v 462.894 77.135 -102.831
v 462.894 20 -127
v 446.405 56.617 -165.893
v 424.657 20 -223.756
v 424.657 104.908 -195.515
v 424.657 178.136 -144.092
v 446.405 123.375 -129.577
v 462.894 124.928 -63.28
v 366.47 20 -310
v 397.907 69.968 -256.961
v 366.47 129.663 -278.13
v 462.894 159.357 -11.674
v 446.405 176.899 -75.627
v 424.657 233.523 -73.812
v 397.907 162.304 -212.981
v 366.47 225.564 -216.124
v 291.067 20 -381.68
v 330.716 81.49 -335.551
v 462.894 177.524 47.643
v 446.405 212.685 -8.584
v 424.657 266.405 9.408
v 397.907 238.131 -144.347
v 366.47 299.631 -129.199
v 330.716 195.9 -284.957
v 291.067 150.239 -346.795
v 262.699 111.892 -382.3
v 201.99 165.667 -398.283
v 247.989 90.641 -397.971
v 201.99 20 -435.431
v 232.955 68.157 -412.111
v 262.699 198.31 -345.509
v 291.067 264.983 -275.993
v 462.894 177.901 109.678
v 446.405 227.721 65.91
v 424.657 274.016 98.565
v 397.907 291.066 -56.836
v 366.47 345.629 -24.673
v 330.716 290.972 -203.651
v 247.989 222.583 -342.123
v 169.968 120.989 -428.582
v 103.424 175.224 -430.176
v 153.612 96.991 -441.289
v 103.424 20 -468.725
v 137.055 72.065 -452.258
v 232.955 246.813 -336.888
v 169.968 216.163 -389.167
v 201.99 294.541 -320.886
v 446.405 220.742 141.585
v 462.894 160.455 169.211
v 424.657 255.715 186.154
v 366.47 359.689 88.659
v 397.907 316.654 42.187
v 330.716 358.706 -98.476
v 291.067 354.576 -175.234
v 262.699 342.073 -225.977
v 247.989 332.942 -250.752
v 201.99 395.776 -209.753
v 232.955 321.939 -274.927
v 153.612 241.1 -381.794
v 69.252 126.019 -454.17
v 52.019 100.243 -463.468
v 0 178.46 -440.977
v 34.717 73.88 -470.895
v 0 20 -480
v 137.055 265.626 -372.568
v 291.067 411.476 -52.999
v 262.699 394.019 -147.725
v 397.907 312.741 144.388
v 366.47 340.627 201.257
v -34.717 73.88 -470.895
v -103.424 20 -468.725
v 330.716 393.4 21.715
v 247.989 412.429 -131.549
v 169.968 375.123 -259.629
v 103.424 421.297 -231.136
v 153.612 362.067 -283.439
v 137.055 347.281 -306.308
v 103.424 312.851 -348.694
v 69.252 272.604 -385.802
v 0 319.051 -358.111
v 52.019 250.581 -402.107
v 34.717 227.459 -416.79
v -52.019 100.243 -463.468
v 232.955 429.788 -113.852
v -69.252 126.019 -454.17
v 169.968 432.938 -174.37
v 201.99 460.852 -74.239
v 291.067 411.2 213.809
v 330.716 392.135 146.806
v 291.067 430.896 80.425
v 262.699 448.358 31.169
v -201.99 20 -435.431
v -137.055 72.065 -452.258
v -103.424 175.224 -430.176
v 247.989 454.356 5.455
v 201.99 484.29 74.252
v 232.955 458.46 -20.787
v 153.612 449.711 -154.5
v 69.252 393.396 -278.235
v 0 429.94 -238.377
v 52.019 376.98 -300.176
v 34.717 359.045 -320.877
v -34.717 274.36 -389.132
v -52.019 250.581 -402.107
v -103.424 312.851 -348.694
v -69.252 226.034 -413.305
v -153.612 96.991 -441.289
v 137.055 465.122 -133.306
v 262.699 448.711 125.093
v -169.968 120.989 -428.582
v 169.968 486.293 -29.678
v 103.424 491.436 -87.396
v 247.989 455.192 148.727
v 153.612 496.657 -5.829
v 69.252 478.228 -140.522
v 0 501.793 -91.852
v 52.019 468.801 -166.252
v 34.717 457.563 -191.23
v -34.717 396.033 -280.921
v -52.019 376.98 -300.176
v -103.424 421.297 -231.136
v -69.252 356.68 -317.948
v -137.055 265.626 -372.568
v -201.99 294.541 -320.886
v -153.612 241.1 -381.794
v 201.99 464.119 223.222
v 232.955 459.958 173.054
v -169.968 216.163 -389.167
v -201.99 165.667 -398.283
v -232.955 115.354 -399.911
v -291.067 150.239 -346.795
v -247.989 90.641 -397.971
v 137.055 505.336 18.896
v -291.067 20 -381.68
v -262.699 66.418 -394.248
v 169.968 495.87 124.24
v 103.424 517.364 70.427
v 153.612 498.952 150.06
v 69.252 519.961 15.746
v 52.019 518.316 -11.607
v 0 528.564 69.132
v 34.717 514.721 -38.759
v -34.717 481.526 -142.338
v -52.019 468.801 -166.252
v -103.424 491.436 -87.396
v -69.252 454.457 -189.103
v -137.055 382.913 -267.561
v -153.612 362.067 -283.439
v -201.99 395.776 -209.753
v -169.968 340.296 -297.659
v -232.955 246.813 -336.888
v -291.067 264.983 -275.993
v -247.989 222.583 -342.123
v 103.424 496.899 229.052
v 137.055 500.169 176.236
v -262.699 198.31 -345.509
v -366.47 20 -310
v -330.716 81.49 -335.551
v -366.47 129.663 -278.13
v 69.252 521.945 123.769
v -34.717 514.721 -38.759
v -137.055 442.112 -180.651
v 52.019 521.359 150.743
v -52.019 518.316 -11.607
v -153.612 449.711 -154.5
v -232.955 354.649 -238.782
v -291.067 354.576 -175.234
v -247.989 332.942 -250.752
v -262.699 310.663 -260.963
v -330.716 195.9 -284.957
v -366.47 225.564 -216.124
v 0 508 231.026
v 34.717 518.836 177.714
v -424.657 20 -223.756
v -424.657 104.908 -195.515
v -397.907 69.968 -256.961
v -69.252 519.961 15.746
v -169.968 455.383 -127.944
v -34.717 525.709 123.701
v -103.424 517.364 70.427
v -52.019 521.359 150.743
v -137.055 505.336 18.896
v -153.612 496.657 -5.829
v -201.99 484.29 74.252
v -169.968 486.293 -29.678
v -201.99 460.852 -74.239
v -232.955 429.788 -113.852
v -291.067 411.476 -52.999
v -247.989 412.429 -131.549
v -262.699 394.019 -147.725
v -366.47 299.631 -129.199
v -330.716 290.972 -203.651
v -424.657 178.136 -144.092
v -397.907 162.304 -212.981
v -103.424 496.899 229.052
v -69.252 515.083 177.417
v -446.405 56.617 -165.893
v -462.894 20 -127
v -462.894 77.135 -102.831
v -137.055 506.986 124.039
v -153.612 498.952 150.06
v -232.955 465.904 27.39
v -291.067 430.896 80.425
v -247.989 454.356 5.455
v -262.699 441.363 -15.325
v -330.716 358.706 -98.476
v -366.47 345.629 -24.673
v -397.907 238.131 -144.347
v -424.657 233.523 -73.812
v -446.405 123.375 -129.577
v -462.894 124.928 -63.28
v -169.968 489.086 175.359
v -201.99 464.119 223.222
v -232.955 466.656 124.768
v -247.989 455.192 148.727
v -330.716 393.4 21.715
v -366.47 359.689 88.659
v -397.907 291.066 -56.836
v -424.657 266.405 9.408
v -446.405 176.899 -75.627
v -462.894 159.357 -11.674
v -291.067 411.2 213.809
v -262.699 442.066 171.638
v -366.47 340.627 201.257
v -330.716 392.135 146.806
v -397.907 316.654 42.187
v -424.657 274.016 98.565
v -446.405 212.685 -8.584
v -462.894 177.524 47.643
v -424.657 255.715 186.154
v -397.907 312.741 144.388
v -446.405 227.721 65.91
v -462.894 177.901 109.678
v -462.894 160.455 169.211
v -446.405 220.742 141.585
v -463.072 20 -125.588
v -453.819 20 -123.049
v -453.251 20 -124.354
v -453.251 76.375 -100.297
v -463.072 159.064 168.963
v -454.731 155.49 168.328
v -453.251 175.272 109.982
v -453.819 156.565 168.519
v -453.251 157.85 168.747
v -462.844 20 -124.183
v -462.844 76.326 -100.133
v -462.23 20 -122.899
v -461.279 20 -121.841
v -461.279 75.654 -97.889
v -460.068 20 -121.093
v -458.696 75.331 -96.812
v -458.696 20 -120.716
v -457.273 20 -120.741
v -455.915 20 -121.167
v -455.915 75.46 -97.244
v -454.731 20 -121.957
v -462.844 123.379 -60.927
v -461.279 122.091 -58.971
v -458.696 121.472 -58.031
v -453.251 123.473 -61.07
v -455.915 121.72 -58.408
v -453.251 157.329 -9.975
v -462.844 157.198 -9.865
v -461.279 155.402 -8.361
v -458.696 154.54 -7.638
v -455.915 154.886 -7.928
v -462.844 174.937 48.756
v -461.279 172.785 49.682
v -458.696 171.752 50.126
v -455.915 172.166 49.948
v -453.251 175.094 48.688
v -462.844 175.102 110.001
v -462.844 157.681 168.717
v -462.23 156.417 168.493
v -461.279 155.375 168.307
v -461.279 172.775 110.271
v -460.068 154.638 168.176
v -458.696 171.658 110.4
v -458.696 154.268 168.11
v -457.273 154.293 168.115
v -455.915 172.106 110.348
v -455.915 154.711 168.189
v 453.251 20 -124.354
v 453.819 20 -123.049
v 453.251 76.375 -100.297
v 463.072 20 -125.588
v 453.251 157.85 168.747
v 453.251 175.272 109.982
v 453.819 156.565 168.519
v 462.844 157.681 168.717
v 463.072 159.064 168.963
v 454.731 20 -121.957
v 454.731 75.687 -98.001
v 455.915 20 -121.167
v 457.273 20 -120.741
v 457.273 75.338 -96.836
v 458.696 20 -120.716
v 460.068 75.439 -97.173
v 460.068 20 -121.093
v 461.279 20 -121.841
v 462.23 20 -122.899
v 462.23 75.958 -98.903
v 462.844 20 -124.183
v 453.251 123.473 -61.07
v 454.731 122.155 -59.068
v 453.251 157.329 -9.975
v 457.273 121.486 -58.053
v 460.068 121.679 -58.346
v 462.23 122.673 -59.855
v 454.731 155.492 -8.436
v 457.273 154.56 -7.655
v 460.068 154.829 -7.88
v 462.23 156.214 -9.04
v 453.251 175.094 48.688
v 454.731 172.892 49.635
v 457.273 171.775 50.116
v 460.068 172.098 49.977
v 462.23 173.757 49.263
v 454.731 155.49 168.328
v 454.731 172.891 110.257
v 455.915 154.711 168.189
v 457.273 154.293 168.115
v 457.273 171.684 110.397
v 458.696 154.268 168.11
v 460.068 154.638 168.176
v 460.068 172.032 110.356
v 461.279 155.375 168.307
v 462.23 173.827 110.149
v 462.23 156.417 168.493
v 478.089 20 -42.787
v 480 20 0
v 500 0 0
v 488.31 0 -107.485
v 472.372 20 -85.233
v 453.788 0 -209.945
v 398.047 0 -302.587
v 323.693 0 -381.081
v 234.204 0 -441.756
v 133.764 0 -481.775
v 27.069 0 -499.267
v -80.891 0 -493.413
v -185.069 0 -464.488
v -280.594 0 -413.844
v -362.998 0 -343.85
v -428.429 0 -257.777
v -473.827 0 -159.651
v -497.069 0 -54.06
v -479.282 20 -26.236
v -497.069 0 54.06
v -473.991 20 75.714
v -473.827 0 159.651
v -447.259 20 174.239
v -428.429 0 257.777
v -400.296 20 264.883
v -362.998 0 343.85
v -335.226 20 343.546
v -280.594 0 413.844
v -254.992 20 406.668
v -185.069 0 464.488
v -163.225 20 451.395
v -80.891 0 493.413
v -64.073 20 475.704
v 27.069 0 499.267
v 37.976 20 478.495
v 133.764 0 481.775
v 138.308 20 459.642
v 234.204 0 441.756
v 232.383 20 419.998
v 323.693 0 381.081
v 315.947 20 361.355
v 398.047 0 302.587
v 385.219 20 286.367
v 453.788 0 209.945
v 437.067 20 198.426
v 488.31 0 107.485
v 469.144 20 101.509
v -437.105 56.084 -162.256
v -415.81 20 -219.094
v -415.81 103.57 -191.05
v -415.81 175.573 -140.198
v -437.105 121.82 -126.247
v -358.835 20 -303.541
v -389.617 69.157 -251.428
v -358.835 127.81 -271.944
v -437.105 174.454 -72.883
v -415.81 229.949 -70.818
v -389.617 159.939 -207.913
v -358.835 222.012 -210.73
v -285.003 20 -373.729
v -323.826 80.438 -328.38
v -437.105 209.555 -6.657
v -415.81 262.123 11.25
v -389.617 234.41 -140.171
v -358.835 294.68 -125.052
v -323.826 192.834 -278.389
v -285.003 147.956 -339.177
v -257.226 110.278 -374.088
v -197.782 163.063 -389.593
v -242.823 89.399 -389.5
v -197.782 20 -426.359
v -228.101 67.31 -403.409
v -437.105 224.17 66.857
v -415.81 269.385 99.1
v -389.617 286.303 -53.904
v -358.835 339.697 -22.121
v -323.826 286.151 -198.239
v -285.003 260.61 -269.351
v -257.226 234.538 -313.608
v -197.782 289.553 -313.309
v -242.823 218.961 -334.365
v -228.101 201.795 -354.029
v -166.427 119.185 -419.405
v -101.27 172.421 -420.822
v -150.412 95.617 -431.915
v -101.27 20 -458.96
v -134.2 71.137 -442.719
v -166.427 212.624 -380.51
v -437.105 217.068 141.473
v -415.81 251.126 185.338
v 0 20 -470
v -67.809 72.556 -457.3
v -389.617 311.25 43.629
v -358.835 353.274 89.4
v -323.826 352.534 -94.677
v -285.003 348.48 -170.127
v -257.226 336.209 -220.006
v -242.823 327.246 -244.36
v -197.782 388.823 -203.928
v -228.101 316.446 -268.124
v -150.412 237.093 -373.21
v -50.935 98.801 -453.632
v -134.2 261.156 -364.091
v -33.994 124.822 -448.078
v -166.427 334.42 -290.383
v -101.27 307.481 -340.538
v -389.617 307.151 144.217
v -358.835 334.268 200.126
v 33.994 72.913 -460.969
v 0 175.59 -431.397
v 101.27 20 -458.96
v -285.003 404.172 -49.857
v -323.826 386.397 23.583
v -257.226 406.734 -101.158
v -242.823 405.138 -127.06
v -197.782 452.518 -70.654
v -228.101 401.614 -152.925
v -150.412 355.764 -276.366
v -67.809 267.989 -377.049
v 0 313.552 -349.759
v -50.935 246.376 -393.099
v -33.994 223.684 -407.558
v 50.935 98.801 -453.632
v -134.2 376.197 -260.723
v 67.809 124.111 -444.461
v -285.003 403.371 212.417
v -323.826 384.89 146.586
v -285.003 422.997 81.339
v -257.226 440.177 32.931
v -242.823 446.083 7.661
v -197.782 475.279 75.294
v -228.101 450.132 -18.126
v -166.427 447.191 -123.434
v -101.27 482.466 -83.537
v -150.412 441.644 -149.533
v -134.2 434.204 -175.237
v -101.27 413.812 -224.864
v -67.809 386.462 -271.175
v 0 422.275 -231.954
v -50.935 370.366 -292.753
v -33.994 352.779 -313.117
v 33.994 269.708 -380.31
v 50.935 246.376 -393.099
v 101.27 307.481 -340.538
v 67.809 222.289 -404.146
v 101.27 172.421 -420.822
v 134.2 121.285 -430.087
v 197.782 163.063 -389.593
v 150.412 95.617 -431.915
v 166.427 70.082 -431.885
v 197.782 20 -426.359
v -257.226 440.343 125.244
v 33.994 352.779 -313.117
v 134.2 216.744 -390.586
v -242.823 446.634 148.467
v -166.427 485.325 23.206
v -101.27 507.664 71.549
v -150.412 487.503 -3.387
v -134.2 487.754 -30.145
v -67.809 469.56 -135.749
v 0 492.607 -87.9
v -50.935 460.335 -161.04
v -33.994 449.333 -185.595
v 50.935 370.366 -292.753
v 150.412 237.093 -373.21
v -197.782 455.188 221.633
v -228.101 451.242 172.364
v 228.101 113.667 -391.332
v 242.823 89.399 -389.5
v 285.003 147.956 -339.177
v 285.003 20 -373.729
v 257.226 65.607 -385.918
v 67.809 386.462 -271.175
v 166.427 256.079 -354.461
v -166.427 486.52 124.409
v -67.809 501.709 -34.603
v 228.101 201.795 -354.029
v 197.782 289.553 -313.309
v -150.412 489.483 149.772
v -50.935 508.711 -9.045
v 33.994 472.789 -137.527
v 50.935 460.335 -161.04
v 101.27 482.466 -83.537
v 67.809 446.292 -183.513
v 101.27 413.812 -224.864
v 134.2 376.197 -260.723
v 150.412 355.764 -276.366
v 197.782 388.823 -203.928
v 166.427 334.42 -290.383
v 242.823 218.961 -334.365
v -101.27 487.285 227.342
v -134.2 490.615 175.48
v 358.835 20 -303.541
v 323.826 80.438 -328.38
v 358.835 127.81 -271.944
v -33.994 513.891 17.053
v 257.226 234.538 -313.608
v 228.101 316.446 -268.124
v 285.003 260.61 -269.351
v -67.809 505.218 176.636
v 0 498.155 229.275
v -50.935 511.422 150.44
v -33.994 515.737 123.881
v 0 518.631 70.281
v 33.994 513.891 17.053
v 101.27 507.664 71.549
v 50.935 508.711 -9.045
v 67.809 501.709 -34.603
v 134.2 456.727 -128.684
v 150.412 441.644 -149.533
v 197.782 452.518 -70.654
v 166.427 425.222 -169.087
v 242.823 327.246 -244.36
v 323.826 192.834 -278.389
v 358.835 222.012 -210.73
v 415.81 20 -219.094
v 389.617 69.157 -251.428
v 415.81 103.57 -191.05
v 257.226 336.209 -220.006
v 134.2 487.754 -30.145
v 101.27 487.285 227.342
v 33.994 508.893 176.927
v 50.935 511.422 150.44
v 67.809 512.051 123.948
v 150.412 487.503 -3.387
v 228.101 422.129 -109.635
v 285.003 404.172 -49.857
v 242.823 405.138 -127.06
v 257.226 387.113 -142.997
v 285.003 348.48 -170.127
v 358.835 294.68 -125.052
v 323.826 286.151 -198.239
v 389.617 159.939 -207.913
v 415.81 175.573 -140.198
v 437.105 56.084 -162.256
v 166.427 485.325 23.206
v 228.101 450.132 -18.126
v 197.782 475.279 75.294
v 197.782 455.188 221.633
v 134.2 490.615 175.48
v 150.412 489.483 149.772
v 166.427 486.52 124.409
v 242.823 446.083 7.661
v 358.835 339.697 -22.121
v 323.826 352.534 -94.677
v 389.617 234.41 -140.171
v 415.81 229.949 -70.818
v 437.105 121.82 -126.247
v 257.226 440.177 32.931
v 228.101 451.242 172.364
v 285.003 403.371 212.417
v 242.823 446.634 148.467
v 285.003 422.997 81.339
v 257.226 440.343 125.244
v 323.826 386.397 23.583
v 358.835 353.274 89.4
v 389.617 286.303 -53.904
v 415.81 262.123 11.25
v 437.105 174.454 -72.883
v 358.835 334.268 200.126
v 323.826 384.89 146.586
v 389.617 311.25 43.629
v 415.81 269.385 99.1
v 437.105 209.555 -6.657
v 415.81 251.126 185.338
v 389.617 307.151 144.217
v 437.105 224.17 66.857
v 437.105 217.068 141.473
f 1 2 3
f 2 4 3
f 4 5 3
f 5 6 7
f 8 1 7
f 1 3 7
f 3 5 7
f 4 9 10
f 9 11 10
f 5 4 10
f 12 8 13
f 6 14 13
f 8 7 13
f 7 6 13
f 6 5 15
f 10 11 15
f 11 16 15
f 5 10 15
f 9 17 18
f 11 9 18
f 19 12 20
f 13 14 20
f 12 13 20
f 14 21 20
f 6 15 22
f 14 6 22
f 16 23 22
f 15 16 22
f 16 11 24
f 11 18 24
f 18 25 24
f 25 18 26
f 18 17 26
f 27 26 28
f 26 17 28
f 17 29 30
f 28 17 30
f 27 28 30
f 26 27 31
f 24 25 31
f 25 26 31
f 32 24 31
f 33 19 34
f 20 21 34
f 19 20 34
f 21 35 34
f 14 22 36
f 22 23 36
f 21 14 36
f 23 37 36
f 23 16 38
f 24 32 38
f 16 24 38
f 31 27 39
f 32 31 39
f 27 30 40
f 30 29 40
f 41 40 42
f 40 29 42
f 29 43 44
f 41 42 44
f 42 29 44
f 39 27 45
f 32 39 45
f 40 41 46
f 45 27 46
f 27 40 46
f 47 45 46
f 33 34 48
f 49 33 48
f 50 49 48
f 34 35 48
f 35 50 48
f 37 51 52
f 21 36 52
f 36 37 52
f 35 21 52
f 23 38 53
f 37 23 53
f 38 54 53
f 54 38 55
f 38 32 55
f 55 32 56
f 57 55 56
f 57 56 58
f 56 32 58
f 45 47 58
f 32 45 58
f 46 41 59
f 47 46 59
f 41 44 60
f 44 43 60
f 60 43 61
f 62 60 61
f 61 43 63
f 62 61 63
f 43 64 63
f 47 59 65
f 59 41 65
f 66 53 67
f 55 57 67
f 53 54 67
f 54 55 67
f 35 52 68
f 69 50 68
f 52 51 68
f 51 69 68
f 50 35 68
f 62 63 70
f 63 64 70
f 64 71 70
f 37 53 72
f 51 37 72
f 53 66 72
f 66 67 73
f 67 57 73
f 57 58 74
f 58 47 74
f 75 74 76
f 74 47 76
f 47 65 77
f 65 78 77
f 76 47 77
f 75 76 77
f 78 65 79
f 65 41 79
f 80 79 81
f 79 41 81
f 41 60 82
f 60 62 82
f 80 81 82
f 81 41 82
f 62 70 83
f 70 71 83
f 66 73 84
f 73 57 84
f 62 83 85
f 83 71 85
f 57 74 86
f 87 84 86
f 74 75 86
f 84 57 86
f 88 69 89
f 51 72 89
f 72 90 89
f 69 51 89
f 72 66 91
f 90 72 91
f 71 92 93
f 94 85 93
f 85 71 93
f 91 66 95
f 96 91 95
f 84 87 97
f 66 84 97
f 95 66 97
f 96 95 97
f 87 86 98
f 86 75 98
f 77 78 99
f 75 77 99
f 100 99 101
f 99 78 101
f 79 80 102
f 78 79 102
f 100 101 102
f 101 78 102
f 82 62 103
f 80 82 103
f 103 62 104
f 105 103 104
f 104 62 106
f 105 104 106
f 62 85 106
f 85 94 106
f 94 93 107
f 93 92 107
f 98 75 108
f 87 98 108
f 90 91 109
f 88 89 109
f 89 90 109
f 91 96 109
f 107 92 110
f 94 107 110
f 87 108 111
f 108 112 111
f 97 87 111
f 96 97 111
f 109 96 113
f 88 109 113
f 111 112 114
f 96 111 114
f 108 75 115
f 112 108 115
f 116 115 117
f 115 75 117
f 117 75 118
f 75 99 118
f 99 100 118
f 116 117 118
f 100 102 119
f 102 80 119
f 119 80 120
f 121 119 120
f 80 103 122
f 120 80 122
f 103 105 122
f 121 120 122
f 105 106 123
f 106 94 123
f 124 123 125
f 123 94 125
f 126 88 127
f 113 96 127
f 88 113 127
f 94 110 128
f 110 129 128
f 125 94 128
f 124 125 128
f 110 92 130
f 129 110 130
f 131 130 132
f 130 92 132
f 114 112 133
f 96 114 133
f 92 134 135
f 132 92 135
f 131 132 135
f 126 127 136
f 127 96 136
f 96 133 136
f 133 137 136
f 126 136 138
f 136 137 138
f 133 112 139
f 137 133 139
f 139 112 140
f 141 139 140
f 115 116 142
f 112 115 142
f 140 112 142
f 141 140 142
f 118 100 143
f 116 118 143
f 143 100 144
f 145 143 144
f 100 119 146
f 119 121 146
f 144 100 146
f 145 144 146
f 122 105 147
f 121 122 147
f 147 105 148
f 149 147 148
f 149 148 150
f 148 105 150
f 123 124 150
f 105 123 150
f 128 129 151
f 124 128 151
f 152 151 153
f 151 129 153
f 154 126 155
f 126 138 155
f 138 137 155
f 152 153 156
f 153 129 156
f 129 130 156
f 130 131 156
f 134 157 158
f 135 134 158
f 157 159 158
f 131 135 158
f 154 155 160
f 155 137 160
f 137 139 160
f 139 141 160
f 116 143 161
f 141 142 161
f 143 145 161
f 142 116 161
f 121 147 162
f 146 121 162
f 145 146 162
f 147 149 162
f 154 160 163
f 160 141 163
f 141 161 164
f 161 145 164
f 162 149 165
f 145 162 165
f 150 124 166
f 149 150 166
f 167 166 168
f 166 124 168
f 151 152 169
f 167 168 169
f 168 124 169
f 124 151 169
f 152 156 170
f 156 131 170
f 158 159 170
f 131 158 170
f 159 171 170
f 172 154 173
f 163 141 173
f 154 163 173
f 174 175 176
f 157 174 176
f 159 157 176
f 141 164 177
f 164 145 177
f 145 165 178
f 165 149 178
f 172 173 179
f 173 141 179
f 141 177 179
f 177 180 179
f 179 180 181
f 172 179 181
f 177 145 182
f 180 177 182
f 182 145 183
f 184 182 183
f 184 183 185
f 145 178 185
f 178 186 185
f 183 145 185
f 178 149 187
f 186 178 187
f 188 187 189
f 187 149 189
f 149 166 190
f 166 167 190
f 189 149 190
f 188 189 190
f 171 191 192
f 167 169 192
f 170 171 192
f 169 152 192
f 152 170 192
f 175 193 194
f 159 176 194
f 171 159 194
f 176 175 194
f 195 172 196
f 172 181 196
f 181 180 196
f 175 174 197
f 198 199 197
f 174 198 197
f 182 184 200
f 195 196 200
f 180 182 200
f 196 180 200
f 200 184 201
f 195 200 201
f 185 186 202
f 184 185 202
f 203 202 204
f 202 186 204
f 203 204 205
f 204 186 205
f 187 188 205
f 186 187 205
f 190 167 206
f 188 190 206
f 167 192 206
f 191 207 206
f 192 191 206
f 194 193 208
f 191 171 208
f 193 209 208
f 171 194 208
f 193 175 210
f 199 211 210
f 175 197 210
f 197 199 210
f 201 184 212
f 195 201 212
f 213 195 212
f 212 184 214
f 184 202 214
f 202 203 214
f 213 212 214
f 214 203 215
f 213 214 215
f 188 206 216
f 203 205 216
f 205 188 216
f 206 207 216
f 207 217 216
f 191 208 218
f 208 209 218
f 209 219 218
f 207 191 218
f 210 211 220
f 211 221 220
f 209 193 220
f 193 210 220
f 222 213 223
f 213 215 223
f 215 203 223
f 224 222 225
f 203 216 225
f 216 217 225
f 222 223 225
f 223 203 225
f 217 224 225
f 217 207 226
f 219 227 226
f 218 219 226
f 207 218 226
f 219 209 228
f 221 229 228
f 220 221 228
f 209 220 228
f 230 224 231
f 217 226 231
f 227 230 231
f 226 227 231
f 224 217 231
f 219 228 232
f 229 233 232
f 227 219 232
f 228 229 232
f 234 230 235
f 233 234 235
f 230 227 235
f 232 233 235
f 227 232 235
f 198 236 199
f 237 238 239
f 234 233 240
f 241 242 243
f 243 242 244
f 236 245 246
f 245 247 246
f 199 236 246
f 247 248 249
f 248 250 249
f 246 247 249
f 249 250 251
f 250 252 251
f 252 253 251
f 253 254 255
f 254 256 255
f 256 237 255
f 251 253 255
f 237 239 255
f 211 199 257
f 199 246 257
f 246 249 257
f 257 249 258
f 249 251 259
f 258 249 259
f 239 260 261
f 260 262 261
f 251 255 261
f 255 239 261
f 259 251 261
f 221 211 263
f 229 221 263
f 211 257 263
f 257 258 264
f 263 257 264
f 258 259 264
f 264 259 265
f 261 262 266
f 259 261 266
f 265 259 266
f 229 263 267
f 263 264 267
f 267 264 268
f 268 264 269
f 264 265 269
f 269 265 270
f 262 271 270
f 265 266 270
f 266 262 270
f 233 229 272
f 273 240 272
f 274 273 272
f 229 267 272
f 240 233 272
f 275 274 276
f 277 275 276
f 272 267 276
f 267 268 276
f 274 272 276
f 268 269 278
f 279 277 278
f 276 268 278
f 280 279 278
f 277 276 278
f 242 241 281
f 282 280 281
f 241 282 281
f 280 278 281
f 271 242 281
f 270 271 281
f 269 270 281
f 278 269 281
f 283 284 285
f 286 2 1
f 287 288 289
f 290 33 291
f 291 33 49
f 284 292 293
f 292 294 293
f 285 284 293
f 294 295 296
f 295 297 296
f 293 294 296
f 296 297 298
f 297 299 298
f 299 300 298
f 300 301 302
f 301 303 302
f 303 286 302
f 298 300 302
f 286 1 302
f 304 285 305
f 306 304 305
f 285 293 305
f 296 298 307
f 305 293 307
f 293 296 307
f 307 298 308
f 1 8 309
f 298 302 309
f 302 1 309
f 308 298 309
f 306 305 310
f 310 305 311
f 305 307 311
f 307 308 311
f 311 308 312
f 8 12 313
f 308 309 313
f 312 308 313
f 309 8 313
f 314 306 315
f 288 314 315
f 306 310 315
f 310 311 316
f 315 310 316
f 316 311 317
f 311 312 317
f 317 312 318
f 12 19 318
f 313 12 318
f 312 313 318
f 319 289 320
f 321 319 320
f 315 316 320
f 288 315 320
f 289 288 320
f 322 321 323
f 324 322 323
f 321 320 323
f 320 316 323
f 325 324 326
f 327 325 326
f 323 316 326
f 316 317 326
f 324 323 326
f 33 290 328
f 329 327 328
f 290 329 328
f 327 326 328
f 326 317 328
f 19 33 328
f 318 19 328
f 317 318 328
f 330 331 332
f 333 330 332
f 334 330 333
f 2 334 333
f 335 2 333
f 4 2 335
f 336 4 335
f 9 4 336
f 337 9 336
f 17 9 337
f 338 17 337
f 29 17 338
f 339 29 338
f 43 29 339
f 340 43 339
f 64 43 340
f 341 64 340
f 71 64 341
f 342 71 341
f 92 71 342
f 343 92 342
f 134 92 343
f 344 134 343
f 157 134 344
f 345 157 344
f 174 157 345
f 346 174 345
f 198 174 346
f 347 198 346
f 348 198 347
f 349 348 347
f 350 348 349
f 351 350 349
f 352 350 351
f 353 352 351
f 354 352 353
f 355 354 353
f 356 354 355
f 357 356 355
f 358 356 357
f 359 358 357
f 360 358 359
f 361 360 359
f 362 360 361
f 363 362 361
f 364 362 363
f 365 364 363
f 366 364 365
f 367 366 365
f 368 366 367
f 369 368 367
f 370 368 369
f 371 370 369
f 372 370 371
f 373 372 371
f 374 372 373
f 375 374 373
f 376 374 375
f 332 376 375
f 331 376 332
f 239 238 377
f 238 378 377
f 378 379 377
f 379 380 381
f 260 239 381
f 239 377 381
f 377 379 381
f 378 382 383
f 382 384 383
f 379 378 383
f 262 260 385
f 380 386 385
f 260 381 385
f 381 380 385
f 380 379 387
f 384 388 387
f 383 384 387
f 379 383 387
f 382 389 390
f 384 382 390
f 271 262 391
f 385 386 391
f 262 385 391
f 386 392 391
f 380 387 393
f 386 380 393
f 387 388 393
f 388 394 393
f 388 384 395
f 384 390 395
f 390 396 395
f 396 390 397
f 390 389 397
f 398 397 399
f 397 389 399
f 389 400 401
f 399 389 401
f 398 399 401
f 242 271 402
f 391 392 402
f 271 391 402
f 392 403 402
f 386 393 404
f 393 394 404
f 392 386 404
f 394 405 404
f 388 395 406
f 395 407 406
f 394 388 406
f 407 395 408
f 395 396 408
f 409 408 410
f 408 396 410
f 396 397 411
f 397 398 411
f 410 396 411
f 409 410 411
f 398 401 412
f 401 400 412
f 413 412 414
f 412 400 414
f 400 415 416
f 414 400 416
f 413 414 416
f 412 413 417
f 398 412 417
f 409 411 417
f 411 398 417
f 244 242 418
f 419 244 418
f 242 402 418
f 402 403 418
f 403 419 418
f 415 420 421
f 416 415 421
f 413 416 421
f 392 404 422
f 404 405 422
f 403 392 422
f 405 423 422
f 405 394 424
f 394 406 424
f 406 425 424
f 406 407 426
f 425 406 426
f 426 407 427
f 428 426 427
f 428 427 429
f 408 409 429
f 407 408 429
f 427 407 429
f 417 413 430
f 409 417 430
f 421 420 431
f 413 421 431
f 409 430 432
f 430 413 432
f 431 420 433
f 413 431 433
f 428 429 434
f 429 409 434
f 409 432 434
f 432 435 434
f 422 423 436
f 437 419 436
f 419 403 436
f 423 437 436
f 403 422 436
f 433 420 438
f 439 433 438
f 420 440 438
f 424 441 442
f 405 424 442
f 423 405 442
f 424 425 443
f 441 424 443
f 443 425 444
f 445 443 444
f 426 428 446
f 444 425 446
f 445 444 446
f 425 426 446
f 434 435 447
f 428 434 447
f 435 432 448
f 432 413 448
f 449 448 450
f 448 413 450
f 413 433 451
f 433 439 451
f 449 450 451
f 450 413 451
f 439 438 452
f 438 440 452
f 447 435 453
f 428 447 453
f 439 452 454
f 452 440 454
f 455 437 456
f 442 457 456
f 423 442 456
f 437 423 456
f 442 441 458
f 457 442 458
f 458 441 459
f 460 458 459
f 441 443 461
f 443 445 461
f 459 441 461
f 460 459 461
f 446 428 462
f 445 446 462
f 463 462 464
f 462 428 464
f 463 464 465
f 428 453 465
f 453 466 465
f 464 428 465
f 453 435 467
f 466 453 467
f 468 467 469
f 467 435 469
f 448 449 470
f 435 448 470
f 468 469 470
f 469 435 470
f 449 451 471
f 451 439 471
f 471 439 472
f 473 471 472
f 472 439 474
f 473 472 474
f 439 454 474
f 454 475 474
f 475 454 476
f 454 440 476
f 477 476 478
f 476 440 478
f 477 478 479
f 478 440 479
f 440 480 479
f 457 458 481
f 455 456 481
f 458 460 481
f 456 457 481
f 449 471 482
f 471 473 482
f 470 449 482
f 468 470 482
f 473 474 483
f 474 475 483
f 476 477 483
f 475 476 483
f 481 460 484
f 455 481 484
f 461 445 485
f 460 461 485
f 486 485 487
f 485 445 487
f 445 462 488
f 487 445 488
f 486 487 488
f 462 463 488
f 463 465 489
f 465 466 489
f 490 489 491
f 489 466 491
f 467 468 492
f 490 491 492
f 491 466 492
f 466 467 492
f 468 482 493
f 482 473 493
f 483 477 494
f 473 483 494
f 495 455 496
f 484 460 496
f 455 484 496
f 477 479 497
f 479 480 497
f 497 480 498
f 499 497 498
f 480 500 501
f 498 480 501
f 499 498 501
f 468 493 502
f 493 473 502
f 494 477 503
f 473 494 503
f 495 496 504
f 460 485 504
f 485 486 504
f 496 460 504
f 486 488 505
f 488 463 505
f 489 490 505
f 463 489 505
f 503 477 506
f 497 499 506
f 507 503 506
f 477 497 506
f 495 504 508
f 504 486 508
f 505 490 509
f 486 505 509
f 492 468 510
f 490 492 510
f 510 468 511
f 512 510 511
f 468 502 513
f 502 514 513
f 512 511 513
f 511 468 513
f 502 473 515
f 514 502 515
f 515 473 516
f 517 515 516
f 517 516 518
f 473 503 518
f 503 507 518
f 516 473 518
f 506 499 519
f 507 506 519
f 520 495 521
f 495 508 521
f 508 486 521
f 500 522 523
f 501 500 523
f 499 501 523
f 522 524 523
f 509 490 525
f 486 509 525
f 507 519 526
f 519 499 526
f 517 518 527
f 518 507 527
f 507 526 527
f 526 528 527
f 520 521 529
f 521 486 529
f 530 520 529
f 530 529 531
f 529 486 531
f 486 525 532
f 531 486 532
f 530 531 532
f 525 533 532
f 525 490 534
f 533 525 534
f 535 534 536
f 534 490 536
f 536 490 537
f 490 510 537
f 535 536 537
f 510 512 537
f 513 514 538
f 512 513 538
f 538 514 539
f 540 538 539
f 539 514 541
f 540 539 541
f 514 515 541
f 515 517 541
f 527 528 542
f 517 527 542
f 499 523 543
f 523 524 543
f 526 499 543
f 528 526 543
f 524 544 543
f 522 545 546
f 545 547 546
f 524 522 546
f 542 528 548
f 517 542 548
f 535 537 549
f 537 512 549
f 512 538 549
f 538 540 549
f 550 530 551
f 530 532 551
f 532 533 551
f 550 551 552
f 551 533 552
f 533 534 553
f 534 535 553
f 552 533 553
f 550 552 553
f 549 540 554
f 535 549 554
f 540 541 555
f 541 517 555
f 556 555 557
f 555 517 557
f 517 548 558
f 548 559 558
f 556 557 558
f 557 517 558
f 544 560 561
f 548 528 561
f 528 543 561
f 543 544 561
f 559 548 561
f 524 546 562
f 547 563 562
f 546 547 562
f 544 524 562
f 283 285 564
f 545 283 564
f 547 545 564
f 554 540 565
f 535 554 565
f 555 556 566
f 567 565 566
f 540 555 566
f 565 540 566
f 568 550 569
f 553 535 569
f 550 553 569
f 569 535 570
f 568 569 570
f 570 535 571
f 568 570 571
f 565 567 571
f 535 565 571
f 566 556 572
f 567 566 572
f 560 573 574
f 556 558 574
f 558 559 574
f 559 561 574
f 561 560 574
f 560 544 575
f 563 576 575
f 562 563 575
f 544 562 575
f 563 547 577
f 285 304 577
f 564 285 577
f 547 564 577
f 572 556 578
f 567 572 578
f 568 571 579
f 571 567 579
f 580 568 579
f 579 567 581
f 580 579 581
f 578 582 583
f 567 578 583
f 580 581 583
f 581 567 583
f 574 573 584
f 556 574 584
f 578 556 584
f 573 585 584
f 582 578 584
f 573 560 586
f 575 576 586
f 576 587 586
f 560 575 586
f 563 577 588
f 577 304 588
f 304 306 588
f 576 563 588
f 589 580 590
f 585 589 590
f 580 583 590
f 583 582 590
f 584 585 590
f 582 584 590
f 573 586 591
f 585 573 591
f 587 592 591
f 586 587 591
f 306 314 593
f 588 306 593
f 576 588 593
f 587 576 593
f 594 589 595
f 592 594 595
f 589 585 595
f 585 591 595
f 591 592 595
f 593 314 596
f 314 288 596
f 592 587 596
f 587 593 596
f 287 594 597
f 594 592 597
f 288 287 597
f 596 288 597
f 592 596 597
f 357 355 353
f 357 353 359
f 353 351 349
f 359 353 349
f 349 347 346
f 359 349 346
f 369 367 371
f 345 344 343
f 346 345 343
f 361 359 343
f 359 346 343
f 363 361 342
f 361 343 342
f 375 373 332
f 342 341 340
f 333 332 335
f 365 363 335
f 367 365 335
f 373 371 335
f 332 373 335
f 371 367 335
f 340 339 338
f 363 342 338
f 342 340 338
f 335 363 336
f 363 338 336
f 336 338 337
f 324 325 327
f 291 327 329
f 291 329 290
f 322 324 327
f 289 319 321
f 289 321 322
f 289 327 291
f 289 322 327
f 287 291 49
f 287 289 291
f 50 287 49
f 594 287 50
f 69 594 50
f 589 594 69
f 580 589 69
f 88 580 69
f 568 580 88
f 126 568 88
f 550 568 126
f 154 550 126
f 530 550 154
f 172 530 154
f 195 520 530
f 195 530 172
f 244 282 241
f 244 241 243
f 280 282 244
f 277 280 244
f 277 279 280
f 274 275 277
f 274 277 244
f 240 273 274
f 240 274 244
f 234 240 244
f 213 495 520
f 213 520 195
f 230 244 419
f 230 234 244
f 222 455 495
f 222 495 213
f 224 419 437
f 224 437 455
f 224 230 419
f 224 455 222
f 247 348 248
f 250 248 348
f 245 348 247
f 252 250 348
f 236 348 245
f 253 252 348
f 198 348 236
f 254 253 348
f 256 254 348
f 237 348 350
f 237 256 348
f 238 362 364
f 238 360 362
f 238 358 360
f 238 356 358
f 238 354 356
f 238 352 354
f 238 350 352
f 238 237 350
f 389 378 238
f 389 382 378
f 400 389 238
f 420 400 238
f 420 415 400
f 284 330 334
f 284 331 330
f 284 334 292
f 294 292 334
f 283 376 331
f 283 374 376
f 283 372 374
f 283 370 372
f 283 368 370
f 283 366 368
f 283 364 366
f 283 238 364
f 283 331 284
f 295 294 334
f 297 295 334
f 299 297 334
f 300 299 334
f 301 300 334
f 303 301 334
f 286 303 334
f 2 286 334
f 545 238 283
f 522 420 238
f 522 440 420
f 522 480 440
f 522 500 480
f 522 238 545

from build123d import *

# Parameters (mm, degrees)
SKETCH1_R           = 500
BOSS_EXTRUDE1_DEPTH = 20
BOSS_EXTRUDE1_TAPER = 45


with BuildPart() as part:
    # Sketch1 → Boss-Extrude1 (new body)
    with BuildSketch(Plane(origin=(0, 0, 0), x_dir=(1, 0, 0), z_dir=(0, 1, 0))):
        Circle(SKETCH1_R)
    extrude(amount=BOSS_EXTRUDE1_DEPTH, taper=BOSS_EXTRUDE1_TAPER)

    # Sweep1: sweep along a path in Sketch3
    with BuildLine(Plane(origin=(0, 0, 0), x_dir=(0, 0, -1), z_dir=(1, 0, 0))) as sweep1_path:
        ThreePointArc((480, 20), (238.376555203, 429.939732355), (-231.026329166, 508))
    # Sketch2 → Sweep1 (sweep)
    with BuildSketch(Plane(origin=(0, 20, 0), x_dir=(1, 0, 0), z_dir=(0, 1, 0))):
        with BuildLine():
            ThreePointArc((-462.894156368, 127), (0, 480), (462.894156368, 127))
            ThreePointArc((462.894156368, 127), (459.395258906, 120.855269204), (453.250528111, 124.354166667))
            ThreePointArc((453.250528111, 124.354166667), (0, 470), (-453.250528111, 124.354166667))
            ThreePointArc((-453.250528111, 124.354166667), (-459.395258906, 120.855269204), (-462.894156368, 127))
        make_face()
    sweep(path=sweep1_path.line)


solid = part.part
